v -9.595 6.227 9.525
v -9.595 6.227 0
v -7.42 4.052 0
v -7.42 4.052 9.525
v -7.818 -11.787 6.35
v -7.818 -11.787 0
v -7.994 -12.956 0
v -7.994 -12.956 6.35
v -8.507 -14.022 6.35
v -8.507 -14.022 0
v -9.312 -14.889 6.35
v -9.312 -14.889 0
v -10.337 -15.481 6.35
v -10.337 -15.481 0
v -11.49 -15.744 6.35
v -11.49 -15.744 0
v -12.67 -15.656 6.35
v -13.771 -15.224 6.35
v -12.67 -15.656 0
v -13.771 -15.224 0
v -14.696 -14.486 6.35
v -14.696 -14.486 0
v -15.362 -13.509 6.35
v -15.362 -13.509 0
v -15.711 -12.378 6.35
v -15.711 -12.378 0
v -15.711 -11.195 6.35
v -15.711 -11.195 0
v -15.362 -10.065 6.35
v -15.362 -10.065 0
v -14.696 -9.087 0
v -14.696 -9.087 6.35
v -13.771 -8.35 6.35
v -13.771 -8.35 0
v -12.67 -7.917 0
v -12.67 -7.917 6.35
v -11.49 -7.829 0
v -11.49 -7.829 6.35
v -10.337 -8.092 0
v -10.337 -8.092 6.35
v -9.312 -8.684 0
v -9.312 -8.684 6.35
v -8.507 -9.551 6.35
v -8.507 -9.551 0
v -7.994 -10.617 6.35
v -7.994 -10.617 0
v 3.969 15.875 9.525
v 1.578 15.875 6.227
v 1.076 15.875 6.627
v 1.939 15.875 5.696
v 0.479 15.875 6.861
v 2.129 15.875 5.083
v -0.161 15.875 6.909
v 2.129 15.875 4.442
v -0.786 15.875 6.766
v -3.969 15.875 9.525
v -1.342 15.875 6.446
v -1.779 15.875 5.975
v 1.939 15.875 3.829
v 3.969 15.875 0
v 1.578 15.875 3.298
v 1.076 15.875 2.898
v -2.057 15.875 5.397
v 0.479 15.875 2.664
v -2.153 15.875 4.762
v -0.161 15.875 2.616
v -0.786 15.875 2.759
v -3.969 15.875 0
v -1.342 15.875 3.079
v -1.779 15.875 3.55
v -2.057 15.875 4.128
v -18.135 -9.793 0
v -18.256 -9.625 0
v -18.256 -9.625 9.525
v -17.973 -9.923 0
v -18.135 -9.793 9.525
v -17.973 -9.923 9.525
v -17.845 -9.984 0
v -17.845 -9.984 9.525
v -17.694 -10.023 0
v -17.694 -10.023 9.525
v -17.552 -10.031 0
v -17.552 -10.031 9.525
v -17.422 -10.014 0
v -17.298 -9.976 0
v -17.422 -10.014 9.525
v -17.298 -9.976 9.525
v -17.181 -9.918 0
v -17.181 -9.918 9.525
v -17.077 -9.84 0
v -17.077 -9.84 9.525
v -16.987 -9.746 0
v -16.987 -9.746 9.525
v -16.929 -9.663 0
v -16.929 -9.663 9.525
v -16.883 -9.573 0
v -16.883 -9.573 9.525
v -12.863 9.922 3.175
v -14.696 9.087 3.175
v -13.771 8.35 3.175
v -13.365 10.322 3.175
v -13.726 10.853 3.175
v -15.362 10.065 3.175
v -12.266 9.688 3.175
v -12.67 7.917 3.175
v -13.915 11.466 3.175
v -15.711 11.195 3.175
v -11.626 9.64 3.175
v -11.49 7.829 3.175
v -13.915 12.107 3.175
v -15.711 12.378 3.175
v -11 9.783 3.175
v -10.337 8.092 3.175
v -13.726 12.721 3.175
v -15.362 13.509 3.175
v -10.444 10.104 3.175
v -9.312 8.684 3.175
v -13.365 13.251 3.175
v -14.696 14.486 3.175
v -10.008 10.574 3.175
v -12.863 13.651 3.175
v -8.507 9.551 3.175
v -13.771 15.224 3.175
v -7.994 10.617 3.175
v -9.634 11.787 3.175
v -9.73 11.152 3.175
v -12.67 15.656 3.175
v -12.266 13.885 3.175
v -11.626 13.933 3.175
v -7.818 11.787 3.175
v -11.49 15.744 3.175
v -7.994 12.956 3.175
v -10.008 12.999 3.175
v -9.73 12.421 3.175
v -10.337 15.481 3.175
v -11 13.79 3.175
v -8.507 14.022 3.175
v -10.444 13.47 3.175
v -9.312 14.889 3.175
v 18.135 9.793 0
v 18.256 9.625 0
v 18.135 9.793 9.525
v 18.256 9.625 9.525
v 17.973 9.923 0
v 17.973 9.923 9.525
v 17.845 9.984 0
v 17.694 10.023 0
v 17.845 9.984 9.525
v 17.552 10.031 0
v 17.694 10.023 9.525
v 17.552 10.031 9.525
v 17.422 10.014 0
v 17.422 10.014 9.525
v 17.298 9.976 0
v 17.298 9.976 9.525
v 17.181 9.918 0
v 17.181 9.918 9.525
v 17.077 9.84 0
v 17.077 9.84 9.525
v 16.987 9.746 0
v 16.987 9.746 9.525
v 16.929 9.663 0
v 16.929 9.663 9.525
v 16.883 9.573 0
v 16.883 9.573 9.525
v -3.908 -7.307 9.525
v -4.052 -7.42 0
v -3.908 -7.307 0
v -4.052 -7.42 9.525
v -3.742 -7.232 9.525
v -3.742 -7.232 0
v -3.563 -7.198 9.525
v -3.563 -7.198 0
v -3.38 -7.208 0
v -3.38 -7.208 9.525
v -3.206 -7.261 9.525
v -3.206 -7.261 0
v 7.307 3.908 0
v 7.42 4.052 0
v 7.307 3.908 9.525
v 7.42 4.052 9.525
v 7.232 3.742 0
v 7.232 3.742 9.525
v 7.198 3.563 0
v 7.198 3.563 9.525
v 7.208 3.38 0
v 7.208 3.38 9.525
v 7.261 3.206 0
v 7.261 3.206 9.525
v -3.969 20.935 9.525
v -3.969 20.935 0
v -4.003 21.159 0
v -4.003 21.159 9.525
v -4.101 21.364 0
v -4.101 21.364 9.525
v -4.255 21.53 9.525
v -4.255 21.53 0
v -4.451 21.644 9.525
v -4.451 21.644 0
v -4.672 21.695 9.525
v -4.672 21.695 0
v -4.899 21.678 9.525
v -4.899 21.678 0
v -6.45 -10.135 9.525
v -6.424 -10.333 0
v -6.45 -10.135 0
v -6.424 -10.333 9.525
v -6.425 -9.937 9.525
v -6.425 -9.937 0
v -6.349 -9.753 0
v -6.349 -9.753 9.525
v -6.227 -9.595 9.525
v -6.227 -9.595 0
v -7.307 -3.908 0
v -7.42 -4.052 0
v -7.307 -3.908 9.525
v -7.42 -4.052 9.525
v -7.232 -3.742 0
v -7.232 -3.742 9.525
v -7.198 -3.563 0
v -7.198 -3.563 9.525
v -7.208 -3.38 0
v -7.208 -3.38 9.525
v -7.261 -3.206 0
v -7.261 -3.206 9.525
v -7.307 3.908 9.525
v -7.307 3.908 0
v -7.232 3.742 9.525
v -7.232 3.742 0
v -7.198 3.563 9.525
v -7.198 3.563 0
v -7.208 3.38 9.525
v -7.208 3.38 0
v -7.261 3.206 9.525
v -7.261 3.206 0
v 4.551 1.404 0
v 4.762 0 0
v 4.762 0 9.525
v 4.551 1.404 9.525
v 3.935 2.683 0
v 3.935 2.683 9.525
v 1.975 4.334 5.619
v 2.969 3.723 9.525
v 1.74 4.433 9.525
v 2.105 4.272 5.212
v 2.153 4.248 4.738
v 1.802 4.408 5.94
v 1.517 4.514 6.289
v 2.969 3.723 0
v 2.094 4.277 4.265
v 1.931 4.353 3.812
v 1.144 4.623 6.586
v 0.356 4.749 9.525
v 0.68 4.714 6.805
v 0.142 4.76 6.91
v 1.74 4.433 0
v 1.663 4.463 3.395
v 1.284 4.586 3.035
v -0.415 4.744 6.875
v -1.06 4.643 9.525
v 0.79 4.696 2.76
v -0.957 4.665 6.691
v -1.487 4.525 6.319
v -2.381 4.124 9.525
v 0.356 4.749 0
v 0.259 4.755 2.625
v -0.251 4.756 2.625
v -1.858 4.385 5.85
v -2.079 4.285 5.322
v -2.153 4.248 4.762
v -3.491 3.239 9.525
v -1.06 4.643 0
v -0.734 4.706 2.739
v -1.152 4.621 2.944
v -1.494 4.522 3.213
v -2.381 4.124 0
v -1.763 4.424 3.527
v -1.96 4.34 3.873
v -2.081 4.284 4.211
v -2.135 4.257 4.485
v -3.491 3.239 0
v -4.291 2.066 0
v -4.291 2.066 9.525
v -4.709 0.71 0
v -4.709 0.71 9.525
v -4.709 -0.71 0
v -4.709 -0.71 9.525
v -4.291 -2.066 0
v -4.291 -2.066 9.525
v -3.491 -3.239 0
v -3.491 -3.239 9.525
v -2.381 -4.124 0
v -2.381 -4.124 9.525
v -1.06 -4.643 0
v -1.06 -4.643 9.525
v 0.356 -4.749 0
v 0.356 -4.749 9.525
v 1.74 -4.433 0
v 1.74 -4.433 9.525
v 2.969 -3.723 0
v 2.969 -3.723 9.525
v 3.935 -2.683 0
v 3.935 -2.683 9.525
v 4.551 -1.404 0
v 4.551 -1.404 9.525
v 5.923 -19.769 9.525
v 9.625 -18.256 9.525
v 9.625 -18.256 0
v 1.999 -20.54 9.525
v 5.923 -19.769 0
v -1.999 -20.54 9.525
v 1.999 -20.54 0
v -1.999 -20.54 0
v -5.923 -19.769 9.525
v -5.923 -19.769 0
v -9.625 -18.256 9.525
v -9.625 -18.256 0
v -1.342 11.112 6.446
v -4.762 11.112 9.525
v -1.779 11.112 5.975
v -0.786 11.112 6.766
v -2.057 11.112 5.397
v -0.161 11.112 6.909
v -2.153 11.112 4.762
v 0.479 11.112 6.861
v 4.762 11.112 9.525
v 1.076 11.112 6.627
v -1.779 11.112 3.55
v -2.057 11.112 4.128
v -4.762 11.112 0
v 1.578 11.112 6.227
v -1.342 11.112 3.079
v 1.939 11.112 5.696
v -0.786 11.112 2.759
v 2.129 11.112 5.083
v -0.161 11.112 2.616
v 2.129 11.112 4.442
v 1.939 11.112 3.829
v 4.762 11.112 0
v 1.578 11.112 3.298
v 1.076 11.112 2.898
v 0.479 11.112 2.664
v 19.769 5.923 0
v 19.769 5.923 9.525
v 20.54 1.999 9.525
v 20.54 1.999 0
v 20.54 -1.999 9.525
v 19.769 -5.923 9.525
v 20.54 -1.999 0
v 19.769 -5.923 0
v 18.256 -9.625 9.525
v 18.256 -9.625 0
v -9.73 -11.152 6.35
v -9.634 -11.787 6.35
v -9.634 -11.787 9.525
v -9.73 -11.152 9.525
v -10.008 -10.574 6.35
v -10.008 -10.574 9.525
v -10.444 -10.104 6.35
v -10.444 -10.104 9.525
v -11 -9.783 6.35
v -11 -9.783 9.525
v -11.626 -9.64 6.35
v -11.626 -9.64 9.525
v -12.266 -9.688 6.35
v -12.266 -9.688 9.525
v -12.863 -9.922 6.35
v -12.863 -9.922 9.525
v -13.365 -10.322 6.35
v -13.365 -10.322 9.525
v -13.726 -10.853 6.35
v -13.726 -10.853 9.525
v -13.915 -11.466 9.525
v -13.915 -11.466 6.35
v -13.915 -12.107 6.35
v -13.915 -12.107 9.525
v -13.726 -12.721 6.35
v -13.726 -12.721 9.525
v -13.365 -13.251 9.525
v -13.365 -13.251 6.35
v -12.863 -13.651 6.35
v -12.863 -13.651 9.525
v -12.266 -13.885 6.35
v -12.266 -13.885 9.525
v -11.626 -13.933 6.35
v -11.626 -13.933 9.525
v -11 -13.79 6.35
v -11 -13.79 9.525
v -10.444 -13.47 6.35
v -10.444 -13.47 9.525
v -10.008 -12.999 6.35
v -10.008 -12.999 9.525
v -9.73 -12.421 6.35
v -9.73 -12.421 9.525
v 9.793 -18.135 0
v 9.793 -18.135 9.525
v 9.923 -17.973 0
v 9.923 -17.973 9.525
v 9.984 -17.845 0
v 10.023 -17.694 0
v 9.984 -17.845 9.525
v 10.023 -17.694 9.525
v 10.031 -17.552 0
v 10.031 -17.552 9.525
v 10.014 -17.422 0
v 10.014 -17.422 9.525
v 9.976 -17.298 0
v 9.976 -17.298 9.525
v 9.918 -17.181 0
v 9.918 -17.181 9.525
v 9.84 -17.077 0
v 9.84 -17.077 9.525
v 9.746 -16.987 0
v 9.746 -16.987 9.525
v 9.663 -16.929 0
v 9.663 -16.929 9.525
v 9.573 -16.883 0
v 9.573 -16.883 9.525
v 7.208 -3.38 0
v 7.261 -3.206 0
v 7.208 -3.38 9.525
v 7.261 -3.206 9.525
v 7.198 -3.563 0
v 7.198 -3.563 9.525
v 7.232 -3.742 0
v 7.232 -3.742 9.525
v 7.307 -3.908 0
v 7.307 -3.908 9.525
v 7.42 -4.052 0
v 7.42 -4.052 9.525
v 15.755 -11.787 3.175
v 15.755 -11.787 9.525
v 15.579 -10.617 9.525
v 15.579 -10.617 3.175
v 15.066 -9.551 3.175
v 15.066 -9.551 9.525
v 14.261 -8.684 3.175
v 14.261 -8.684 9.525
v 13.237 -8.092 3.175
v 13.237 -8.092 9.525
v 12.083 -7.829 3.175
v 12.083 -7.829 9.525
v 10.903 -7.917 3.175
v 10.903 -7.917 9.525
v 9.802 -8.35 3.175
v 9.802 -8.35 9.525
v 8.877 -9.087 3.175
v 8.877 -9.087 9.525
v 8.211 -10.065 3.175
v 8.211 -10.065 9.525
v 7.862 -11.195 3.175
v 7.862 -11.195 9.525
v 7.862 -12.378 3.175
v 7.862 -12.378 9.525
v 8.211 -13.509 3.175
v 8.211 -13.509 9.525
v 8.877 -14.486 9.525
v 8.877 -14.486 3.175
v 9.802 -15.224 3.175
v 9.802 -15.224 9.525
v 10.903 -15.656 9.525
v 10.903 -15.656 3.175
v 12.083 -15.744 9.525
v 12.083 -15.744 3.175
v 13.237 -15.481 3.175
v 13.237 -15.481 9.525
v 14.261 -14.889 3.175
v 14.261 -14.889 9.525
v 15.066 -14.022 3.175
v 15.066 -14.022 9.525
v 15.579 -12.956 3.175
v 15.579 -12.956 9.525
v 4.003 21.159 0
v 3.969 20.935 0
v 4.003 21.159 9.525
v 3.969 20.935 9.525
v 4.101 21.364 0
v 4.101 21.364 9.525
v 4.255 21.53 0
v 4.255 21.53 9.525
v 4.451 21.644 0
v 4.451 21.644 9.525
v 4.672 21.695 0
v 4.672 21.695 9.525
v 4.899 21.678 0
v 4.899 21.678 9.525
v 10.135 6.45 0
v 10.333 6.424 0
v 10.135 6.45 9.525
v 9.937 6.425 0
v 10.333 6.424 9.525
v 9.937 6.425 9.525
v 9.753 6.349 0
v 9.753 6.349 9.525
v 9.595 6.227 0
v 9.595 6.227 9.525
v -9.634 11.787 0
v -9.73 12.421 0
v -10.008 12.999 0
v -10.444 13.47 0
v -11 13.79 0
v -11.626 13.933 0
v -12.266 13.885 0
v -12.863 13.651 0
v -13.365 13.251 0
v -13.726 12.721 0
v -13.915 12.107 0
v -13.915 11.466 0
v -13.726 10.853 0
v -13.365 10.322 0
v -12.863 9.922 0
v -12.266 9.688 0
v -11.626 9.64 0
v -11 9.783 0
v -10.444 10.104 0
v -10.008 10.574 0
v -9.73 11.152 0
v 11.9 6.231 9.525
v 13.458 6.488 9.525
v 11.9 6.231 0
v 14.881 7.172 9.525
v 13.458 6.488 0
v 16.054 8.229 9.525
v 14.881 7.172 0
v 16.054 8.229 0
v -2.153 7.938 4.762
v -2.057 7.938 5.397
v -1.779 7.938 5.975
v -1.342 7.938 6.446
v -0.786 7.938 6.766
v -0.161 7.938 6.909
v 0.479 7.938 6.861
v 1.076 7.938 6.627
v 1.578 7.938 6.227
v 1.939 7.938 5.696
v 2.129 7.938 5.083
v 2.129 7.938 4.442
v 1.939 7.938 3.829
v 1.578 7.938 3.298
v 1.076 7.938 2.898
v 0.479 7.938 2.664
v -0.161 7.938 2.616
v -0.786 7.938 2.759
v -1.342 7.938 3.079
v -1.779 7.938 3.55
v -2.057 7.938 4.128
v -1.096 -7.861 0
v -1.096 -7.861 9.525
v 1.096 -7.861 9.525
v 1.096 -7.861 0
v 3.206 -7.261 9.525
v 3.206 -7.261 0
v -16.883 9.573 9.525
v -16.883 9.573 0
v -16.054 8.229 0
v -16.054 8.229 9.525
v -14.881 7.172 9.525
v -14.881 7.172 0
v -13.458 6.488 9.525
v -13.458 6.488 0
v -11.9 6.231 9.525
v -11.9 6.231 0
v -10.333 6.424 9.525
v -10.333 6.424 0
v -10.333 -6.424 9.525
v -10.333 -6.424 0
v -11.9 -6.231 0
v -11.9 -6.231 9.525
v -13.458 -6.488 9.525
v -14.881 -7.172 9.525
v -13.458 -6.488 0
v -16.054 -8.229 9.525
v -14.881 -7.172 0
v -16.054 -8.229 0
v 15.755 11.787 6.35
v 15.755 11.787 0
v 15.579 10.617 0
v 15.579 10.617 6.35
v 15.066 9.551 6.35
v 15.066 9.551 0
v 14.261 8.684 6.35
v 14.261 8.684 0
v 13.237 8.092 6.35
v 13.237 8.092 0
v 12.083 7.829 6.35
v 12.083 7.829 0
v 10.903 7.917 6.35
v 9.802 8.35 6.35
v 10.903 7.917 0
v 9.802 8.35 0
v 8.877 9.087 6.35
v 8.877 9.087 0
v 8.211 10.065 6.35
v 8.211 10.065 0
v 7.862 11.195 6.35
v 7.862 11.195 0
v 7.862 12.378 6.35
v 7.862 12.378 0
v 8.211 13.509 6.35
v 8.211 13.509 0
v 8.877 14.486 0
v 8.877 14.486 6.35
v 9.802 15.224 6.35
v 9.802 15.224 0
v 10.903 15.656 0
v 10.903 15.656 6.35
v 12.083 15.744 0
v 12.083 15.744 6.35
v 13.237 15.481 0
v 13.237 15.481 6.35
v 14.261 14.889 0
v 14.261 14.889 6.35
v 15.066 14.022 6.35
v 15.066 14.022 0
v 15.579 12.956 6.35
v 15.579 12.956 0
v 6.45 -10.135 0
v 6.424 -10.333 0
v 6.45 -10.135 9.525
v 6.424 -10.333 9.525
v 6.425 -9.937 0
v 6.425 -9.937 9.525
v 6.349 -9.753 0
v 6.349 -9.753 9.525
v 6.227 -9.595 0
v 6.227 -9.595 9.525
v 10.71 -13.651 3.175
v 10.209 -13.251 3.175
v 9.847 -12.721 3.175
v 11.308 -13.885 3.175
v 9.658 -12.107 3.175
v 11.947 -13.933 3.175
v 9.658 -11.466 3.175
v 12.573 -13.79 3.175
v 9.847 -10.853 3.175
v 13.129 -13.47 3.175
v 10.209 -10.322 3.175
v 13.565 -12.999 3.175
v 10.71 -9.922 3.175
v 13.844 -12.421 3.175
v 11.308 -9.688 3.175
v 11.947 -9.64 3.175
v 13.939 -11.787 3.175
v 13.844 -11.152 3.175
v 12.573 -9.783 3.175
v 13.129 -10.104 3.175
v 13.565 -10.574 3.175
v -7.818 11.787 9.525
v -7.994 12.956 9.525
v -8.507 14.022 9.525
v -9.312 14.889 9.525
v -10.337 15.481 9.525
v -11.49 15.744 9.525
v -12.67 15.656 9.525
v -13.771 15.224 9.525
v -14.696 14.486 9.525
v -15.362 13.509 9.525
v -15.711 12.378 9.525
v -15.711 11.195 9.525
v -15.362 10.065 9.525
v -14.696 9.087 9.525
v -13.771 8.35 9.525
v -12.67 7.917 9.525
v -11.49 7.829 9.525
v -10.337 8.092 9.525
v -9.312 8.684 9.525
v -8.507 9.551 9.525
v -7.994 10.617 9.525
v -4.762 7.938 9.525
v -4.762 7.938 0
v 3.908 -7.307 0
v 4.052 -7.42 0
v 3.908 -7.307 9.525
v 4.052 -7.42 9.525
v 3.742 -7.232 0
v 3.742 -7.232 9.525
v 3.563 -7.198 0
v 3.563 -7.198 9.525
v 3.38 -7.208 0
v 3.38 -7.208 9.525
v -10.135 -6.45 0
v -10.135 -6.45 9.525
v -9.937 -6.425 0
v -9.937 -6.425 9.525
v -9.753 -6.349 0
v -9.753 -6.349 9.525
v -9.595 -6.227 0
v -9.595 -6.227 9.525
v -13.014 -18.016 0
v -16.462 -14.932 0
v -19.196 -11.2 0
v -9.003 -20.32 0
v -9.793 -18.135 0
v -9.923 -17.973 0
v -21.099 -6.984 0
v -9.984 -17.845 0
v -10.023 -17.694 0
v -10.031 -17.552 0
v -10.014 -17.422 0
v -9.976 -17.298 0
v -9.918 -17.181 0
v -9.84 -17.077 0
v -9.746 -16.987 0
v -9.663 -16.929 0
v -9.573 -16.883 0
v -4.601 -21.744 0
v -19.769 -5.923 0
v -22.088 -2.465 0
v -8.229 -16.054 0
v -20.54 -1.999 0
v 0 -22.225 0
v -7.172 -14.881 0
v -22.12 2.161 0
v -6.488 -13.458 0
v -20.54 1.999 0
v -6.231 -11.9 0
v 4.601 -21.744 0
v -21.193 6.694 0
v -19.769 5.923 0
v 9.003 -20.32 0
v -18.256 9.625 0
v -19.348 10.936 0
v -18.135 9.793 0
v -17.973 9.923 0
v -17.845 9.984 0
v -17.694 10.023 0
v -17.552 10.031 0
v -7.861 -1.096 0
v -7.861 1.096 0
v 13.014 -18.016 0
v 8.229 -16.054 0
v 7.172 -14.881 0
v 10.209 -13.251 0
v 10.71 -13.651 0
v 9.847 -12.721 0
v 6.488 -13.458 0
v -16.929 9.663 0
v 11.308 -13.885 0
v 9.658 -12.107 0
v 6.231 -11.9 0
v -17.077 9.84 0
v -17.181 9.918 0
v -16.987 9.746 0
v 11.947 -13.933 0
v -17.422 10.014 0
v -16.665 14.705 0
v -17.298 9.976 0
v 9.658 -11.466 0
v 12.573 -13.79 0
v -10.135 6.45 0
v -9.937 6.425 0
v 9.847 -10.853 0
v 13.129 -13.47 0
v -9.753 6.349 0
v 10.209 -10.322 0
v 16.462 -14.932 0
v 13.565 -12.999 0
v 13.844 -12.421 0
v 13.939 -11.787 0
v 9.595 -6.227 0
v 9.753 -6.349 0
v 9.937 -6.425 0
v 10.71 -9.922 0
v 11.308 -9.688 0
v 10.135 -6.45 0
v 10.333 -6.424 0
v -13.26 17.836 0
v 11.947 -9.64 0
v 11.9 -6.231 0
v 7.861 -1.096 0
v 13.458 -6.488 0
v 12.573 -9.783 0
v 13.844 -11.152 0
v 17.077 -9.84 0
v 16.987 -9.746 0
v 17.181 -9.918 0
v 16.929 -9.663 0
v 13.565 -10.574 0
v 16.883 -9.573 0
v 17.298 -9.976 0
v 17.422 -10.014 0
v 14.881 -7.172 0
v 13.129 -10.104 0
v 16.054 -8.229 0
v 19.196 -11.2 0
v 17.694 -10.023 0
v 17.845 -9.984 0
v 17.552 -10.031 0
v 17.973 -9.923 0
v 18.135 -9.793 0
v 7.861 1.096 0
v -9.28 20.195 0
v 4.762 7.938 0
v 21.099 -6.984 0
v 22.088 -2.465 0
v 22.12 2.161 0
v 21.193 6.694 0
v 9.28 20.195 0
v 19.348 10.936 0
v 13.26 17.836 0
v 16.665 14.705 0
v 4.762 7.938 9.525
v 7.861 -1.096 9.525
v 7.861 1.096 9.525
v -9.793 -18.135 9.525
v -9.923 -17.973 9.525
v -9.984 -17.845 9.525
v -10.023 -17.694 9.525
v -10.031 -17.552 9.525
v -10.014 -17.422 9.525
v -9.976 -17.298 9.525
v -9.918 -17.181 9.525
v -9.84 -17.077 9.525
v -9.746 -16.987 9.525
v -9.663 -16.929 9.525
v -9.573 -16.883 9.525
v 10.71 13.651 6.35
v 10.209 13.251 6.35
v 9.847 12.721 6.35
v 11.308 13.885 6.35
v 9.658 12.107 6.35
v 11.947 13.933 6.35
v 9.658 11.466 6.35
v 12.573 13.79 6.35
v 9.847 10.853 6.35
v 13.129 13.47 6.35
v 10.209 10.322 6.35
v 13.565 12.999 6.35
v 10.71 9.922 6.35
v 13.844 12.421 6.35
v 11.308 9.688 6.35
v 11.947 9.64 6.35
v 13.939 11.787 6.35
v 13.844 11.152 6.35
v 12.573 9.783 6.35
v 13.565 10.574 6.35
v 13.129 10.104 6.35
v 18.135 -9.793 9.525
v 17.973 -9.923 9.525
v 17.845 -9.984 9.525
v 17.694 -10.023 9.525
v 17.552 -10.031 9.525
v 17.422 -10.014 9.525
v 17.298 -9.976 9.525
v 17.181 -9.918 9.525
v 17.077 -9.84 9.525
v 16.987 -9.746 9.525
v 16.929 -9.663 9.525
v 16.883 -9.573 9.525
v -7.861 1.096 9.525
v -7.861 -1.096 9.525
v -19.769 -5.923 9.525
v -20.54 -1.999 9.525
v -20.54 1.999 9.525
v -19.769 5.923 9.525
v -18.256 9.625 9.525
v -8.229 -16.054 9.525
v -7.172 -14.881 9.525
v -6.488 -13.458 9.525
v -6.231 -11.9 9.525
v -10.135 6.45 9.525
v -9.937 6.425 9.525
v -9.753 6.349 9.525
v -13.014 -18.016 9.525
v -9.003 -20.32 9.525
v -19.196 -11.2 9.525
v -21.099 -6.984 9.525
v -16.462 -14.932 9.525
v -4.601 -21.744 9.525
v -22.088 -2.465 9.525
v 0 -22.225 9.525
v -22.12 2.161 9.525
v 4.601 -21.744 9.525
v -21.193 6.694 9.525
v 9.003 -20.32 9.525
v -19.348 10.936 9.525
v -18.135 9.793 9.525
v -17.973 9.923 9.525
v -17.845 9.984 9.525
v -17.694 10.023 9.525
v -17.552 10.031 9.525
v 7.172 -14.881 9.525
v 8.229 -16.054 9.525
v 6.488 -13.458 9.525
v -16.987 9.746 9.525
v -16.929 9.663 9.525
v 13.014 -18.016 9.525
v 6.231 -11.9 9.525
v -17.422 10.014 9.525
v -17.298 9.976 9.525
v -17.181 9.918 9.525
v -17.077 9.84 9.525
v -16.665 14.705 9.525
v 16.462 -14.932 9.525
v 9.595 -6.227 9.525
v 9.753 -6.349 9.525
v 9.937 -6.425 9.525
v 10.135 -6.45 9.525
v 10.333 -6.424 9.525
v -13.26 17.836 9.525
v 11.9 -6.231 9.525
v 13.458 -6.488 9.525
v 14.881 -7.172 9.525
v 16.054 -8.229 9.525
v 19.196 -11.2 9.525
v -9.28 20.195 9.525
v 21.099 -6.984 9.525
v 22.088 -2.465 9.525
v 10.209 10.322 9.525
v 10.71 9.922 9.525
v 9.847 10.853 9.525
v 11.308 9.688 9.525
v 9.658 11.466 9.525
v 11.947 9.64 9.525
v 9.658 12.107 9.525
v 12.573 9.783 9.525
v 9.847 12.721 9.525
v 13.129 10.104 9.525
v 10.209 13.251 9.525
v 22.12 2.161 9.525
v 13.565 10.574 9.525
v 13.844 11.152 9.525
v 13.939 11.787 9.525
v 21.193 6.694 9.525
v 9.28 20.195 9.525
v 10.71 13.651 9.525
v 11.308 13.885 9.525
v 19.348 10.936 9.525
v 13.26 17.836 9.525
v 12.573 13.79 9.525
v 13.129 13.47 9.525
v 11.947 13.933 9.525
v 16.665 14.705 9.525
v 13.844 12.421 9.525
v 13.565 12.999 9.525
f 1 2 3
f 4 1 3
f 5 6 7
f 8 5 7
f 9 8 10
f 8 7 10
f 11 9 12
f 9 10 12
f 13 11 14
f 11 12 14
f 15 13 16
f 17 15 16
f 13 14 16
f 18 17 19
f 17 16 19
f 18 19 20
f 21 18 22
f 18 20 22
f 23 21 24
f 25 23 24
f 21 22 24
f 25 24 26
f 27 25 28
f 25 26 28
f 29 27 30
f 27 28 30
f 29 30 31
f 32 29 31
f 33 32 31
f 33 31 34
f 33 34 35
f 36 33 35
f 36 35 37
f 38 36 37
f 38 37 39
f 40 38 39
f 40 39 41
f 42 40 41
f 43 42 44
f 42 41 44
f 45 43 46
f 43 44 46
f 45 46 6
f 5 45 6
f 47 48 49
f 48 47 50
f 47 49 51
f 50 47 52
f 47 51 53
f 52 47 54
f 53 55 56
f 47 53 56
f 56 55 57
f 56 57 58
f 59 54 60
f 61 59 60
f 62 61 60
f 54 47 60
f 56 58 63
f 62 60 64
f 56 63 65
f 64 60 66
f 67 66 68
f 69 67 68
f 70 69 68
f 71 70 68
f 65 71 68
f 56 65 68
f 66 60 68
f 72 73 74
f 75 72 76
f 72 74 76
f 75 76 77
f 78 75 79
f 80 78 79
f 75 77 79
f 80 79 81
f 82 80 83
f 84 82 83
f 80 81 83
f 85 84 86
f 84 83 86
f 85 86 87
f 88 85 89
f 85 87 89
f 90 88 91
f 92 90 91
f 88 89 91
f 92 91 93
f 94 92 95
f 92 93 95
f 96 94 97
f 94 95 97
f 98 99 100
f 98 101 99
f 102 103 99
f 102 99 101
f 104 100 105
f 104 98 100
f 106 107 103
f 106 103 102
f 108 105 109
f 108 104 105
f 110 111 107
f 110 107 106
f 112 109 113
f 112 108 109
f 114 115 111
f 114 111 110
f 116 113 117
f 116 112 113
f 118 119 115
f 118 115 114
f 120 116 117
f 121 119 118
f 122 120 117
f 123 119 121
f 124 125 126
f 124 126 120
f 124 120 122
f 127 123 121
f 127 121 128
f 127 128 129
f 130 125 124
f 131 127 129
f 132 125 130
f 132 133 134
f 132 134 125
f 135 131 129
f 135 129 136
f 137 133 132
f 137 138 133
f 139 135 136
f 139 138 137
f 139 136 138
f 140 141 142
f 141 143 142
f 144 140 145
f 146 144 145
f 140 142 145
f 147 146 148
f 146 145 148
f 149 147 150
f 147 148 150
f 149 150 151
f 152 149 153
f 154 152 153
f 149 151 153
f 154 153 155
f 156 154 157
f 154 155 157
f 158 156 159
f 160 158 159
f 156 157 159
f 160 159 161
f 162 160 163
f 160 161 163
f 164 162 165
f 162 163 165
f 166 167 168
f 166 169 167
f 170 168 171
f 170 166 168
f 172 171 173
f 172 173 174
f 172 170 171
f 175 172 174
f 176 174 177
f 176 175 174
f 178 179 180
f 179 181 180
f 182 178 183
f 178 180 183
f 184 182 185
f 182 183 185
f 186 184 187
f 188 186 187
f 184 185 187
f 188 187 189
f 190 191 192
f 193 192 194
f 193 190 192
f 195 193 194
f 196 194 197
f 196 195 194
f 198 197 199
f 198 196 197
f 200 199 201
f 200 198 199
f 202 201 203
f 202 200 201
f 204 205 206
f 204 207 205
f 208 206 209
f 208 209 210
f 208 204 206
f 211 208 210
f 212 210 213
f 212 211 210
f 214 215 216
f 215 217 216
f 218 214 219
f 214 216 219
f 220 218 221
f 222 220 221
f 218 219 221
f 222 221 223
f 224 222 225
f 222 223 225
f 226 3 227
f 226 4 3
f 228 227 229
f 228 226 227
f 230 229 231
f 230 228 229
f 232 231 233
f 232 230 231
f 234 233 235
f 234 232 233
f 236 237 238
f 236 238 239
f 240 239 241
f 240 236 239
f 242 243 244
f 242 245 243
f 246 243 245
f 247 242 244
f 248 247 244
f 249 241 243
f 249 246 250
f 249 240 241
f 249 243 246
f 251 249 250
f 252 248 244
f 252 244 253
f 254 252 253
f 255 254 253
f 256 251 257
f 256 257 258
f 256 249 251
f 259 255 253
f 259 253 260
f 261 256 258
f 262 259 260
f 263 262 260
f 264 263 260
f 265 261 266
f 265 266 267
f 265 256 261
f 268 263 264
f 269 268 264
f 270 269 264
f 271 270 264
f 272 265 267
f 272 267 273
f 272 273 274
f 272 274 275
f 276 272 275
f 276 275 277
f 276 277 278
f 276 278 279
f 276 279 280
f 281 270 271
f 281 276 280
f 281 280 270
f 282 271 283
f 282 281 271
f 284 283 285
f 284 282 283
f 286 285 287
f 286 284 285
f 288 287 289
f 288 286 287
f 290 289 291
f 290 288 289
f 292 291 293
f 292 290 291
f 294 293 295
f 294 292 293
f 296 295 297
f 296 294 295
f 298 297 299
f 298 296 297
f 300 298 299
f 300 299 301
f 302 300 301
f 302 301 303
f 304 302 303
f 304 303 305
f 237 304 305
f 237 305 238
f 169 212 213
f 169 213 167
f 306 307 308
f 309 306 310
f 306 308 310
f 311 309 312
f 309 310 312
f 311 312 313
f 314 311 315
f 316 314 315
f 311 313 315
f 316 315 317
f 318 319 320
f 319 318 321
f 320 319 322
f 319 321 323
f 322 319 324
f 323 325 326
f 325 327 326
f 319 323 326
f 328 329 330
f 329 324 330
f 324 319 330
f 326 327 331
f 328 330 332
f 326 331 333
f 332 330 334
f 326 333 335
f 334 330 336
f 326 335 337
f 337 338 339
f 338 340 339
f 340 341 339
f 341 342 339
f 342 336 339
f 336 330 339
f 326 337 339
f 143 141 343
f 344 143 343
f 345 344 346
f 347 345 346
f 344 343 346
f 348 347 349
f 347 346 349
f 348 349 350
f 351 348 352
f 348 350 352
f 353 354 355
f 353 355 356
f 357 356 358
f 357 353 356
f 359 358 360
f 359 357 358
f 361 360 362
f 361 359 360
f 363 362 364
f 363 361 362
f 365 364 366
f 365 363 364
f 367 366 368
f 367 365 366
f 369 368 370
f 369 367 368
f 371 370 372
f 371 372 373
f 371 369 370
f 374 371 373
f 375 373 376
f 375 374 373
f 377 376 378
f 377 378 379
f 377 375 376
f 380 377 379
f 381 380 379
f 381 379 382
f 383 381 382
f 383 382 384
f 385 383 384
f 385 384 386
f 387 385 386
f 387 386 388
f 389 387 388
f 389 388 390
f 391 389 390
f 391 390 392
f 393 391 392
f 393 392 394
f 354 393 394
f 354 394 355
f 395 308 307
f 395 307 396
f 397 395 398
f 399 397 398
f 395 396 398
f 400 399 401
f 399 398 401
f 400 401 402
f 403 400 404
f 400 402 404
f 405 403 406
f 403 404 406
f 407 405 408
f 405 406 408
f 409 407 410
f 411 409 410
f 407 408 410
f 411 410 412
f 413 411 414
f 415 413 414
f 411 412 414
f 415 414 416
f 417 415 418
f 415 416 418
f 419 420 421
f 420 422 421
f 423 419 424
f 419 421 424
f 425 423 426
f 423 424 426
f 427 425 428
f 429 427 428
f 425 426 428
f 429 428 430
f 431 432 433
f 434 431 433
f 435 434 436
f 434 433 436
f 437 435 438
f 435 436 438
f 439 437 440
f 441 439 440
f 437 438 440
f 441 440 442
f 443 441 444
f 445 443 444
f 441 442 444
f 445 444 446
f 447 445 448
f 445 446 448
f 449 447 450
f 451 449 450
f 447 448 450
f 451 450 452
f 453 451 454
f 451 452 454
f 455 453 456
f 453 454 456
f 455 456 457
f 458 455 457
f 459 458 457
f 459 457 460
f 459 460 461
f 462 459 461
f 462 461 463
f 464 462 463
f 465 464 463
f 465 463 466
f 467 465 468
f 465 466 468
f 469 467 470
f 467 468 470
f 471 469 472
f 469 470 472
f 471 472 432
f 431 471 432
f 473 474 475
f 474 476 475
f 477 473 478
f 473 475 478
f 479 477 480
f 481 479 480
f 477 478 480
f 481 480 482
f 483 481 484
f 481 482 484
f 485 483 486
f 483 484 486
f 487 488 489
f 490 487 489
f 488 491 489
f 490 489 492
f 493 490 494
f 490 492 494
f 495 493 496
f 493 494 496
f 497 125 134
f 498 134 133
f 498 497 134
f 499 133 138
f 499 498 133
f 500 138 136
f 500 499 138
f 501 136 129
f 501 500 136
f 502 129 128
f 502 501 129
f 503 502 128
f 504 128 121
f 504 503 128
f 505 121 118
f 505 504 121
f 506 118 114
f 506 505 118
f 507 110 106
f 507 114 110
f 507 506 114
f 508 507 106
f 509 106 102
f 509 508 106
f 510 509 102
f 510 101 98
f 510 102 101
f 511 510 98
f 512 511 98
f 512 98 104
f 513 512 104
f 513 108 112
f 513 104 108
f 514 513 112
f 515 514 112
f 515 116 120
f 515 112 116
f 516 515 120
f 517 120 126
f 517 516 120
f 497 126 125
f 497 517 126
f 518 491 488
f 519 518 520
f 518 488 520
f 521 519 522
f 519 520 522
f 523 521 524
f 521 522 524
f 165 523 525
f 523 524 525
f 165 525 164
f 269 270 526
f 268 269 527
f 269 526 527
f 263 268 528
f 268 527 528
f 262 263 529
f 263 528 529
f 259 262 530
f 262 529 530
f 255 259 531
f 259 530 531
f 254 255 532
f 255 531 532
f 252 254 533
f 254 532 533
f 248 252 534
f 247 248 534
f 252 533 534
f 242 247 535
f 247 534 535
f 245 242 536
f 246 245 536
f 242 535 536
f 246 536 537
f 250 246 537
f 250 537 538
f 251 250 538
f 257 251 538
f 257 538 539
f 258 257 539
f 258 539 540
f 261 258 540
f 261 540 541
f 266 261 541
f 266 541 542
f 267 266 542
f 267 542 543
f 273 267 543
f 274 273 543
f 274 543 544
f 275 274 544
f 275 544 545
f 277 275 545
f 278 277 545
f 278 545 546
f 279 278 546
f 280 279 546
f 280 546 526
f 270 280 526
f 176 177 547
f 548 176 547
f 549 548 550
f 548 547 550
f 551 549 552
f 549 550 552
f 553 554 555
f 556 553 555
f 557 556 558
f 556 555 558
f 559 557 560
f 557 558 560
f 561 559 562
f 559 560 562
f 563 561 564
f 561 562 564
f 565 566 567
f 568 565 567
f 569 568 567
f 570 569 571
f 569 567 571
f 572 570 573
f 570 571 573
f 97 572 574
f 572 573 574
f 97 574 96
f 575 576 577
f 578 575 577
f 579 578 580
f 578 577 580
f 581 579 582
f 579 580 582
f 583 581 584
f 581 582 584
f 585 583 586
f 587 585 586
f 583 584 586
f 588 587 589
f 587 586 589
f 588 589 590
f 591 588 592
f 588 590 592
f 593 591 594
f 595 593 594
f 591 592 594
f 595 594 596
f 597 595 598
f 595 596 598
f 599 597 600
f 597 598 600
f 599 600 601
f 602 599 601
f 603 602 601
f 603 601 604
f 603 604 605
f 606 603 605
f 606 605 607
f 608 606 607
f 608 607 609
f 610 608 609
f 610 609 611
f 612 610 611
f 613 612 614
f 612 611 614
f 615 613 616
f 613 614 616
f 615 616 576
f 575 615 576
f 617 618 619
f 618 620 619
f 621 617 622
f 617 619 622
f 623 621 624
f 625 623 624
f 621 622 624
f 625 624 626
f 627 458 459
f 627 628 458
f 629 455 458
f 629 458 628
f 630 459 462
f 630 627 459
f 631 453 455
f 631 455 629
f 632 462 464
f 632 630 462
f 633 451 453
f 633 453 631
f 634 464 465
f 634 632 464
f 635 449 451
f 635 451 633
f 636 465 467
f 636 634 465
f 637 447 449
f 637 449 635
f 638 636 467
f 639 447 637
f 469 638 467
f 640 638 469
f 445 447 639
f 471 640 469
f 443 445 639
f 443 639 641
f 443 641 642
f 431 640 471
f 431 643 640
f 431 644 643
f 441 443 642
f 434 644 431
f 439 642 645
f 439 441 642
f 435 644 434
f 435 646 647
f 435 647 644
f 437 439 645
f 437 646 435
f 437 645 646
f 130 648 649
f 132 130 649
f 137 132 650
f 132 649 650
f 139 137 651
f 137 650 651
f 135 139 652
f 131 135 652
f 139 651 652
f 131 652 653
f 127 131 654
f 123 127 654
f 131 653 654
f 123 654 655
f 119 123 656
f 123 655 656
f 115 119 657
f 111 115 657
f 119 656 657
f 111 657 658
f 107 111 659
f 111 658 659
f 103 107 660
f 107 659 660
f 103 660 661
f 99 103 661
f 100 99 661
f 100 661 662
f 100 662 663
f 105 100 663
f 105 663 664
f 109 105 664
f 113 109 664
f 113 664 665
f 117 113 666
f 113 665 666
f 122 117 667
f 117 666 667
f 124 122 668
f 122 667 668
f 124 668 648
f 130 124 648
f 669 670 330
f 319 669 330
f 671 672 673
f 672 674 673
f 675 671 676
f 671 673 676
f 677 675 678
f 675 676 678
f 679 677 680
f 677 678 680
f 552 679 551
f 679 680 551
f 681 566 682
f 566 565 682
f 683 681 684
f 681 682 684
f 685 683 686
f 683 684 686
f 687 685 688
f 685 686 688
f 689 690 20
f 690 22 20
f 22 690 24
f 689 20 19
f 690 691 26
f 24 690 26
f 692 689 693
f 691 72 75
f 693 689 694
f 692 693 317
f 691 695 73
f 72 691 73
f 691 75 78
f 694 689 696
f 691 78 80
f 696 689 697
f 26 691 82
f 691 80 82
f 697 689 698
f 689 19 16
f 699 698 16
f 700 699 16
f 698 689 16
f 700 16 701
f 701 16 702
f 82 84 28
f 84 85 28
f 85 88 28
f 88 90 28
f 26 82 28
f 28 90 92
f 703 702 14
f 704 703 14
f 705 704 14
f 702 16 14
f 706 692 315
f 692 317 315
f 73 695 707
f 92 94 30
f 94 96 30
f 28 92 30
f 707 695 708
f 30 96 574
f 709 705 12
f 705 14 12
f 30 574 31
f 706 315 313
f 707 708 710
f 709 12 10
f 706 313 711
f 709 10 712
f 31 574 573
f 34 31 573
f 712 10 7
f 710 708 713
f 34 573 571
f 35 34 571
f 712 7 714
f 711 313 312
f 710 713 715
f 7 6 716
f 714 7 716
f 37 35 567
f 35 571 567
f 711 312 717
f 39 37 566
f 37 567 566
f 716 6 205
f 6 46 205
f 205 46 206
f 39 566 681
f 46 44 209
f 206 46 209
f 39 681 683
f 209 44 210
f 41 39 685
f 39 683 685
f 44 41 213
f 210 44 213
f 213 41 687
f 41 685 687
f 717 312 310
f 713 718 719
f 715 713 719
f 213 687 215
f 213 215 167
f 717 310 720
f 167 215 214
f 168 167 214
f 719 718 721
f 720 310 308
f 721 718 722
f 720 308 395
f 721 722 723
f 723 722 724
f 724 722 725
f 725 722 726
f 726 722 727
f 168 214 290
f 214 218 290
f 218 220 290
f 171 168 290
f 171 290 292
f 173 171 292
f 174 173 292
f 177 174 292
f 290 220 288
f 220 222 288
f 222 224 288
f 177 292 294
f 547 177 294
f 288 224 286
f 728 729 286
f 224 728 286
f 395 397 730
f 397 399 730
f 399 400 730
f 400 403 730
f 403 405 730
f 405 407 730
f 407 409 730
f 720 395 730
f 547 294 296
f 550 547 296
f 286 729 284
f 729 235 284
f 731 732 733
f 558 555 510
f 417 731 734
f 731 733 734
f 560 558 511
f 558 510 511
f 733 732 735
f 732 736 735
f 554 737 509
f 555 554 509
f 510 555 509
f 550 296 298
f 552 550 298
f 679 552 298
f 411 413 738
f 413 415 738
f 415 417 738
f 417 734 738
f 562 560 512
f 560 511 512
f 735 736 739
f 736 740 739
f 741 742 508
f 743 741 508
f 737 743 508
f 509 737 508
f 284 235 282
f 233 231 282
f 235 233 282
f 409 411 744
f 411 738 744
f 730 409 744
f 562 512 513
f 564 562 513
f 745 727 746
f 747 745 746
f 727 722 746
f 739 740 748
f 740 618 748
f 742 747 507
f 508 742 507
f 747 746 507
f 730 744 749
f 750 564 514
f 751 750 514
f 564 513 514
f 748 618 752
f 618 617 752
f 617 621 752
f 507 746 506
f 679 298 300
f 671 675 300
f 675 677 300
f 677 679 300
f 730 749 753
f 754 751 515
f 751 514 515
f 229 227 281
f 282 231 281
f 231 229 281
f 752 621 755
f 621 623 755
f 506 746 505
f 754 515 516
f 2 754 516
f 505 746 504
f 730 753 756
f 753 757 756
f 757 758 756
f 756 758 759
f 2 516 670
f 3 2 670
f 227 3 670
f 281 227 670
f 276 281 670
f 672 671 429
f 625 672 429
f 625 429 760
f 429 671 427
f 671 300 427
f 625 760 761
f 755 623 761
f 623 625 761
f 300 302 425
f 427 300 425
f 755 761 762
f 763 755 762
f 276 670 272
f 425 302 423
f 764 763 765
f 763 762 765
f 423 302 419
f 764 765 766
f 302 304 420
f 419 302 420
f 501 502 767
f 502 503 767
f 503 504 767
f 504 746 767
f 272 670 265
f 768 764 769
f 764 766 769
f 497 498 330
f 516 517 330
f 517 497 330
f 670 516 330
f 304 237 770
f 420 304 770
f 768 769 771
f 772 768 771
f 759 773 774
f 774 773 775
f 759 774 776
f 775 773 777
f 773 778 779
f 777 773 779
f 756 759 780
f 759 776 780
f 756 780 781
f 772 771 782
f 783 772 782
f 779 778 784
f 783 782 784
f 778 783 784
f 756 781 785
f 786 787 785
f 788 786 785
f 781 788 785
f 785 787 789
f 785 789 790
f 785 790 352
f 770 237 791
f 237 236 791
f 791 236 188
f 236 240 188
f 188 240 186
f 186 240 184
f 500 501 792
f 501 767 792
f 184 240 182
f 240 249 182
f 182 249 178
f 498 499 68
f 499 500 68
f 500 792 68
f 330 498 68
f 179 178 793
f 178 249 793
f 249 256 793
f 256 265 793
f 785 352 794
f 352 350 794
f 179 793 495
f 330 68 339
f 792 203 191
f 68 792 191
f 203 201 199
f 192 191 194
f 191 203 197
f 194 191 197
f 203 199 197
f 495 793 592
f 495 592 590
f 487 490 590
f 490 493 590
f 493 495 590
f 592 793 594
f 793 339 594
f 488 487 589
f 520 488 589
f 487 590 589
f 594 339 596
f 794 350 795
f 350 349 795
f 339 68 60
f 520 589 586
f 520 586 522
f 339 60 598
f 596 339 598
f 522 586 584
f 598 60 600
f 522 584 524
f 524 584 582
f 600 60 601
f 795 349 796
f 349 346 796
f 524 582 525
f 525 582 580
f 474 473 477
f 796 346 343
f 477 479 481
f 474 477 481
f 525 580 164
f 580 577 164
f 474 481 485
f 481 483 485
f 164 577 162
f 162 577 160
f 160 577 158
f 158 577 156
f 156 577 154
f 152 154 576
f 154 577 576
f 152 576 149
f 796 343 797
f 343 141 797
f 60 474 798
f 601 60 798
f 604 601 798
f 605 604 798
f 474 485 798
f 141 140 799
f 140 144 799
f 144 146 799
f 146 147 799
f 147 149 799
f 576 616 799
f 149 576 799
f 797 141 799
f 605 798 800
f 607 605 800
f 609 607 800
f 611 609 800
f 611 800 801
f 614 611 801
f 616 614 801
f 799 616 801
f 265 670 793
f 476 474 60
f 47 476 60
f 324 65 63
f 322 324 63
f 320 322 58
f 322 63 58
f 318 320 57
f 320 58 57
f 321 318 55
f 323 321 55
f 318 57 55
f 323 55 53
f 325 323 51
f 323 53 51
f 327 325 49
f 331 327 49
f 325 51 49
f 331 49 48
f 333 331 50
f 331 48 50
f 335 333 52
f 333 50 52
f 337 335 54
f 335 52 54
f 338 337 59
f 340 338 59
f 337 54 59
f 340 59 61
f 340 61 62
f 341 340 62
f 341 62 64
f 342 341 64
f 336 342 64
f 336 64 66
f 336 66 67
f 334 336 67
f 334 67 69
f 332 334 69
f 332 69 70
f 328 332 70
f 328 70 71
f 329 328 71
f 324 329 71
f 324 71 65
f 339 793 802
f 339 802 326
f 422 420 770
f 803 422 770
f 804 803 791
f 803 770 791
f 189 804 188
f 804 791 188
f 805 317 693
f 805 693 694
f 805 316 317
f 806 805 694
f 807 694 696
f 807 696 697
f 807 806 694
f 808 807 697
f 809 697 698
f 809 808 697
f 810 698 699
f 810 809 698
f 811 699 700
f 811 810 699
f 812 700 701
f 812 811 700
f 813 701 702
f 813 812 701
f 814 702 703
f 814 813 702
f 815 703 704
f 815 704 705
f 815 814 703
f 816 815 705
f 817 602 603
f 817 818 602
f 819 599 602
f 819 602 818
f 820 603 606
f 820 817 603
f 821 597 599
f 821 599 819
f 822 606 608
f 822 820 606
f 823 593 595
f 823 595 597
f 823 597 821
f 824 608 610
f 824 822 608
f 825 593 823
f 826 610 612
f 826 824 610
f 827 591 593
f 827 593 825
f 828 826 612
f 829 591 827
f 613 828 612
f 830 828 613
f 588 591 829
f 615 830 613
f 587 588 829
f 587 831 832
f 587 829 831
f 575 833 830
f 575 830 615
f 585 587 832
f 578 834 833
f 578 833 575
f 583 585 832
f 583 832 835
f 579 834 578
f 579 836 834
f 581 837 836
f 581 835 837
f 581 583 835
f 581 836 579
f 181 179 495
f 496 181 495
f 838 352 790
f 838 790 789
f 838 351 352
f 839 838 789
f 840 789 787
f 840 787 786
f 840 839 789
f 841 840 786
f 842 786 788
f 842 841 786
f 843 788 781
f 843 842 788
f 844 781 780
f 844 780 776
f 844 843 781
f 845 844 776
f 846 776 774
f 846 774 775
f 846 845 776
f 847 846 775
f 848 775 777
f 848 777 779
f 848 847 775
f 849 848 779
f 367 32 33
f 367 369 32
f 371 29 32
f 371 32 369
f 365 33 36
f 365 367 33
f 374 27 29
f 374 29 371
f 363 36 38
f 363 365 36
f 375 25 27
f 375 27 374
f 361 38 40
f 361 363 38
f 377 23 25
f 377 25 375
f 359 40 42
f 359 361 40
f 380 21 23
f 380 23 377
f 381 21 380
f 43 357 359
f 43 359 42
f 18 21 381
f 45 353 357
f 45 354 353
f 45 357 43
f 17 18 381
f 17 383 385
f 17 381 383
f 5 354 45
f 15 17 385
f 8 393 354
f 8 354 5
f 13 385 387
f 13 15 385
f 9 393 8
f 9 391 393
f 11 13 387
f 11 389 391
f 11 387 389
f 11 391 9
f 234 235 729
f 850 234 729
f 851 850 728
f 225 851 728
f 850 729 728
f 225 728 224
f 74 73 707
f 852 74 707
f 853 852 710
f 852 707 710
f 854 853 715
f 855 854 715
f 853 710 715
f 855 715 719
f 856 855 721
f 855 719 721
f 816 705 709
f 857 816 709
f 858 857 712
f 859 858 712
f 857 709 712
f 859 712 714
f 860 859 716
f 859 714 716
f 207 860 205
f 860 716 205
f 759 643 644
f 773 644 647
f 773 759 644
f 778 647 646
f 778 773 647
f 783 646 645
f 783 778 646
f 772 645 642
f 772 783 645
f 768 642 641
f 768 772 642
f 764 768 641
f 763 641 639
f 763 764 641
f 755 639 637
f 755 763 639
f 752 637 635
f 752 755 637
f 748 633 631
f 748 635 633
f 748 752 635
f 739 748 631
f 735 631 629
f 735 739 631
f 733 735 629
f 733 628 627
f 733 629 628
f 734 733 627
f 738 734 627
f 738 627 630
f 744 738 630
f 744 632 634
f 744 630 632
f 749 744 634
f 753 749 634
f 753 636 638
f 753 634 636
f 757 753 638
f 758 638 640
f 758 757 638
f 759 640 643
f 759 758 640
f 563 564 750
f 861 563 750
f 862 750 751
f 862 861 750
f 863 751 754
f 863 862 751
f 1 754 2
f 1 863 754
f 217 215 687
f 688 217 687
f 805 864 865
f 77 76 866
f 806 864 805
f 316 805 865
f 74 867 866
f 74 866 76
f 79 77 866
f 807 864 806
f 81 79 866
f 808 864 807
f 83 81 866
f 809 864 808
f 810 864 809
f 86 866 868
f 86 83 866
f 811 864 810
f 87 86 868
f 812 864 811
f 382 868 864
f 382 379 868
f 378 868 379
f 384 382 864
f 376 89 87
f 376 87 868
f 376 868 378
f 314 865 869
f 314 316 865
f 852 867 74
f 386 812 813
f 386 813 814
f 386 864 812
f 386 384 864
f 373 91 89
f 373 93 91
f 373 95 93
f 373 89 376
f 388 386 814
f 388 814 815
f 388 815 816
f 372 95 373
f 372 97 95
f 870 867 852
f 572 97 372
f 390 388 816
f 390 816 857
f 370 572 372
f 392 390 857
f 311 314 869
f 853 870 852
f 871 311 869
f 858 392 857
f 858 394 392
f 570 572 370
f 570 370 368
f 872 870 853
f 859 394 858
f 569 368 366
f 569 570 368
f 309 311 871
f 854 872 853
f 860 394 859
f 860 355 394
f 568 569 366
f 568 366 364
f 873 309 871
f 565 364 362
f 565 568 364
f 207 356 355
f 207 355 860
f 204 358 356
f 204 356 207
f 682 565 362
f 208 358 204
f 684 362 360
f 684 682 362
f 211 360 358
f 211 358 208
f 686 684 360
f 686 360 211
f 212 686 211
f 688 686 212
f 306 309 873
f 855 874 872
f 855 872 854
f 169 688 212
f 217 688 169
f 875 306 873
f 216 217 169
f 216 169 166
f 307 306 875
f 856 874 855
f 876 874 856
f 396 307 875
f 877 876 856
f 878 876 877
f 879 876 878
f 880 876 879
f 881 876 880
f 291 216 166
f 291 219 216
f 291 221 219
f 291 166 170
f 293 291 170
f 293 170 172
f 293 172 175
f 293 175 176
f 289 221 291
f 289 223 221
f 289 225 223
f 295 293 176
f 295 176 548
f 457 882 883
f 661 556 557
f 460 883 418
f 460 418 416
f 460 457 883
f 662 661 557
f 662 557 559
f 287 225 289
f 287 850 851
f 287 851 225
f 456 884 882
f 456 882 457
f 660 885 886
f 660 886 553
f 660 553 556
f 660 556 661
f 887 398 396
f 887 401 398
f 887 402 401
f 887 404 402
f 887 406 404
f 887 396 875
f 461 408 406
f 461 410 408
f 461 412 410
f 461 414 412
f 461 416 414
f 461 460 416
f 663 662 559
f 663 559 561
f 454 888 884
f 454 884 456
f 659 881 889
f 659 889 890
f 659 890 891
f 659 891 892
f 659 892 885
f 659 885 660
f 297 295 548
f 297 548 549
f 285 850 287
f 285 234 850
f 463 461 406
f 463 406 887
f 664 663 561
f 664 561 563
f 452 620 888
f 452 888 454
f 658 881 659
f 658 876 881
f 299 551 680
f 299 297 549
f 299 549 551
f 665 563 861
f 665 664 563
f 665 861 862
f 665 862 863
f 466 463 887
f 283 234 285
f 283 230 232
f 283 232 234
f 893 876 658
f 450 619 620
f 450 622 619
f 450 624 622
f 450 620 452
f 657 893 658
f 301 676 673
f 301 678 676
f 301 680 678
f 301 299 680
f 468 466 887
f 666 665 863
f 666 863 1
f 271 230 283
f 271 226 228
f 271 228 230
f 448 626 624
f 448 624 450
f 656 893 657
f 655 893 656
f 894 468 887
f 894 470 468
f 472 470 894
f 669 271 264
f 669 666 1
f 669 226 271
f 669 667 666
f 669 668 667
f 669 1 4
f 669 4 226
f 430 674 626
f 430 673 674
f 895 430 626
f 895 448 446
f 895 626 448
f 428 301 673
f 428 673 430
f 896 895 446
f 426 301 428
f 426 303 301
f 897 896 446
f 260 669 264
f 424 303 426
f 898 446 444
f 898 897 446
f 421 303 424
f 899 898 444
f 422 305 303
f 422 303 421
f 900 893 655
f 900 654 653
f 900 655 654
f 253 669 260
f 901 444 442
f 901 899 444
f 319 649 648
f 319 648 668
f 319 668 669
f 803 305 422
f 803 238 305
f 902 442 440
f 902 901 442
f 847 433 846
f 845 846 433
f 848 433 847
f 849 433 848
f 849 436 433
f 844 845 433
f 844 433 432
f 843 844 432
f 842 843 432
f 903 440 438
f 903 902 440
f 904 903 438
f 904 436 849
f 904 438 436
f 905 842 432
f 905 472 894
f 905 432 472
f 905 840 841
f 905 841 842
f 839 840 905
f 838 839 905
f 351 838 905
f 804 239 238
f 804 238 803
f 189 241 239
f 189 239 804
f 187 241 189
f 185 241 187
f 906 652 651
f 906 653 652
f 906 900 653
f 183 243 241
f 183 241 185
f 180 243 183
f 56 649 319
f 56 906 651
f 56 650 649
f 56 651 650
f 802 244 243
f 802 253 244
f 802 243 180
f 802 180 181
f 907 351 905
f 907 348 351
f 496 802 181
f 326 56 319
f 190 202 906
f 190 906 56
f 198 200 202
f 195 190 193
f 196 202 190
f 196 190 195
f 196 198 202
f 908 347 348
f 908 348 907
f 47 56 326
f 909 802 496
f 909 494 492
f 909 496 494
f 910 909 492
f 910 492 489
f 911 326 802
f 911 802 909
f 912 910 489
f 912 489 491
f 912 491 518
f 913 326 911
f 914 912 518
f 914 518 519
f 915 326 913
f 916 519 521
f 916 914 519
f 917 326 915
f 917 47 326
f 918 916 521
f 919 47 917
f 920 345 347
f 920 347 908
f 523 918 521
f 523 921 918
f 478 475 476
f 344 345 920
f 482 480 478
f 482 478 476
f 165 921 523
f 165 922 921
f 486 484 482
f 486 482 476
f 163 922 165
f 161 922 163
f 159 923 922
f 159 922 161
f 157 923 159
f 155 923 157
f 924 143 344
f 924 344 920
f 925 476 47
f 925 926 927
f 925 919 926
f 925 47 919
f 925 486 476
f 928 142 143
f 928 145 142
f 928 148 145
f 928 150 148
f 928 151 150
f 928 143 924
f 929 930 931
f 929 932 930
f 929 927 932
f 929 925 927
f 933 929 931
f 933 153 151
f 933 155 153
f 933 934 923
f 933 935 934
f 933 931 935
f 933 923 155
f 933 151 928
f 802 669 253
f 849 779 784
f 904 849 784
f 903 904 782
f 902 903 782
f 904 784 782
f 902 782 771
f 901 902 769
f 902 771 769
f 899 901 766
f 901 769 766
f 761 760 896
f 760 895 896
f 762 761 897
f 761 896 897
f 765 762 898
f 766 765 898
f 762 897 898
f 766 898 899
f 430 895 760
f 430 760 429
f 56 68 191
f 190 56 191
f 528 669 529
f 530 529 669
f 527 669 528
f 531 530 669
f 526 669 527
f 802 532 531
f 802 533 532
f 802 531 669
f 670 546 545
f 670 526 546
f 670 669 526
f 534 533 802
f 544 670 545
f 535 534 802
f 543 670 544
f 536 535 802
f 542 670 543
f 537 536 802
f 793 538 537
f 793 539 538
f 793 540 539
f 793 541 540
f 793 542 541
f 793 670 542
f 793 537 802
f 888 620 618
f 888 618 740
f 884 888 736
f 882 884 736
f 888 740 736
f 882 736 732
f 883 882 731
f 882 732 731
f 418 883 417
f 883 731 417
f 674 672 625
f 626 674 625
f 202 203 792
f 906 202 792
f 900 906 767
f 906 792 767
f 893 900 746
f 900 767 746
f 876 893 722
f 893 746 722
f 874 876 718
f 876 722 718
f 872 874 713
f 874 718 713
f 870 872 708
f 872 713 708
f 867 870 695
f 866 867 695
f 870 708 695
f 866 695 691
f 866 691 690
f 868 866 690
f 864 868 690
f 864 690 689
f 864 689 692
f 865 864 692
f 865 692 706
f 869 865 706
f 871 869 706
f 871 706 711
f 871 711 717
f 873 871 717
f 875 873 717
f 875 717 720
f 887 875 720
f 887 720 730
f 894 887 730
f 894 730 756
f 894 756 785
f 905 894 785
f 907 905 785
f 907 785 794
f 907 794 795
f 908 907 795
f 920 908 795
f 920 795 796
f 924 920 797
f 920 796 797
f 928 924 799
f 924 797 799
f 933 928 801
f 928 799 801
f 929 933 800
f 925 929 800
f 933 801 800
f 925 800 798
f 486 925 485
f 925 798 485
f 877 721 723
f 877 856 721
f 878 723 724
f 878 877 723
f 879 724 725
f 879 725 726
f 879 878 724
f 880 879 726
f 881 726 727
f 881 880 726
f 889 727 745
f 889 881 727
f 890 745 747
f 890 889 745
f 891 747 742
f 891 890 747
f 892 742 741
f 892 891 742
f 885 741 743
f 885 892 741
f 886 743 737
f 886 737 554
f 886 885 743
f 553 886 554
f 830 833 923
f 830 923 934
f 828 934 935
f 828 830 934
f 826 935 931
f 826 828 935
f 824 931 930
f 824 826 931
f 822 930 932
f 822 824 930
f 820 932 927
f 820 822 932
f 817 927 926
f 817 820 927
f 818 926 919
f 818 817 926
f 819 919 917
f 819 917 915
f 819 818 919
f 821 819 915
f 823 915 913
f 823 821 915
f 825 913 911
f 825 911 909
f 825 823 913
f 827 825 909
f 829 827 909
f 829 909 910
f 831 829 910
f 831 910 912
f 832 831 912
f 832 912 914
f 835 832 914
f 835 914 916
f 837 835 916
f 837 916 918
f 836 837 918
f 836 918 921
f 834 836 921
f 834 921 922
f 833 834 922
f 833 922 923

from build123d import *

# Parameters (mm, degrees)
F0_R            = 2.15265
F0_R_2          = 4.7625
F0_W            = 9.525
F0_H            = 3.175
F1_DEPTH        = 9.525
F2_R            = 2.15265
F3_REACH        = 44.1896136501
F6_R            = 3.96875
F7_DEPTH        = 6.35
F9_DEPTH        = 9.525
F9_COPIES_COUNT = 3
F9_COPIES_ANGLE = 180
F10_R           = 0.762
F12_R           = 3.96875
F13_DEPTH       = 6.35


# Not quite as in the source:
# - a feature of the source that left no trace in its solid (it failed there, or was rolled back) is left out
# - a pattern or mirror of a feature is missing from the dataset's text; its kind, count and spacing are read off the source's solid


with BuildPart() as f1:
    # F0 (on Top) → F1 (new body)
    with BuildSketch(Plane.XY):
        with BuildLine():
            Line((3.96875, 15.875), (-3.96875, 15.875))
            Line((-3.96875, 15.875), (-3.96875, 21.8677764859))
            ThreePointArc((-3.96875, 21.8677764859), (0, -22.225), (3.96875, 21.8677764859))
            Line((3.96875, 21.8677764859), (3.96875, 15.875))
        make_face()
        with Locations((-11.7865861589, -11.7865861589)):
            Circle(F0_R, mode=Mode.SUBTRACT)
        with Locations((11.7865861589, -11.7865861589)):
            Circle(F0_R, mode=Mode.SUBTRACT)
        with Locations((-11.7865861589, 11.7865861589)):
            Circle(F0_R, mode=Mode.SUBTRACT)
        Circle(F0_R_2, mode=Mode.SUBTRACT)
        with Locations((0, 9.525)):
            Rectangle(F0_W, F0_H, mode=Mode.SUBTRACT)
        with Locations((11.7865861589, 11.7865861589)):
            Circle(F0_R, mode=Mode.SUBTRACT)
    extrude(amount=F1_DEPTH)

    f3_end = f1.faces().sort_by_distance((-4.7625, 0, 4.7625))[0]
    # F2 (on face) → F3 (cut, up to a face of the model that its end follows)
    with BuildSketch(Plane(origin=(0, 15.875, 0), x_dir=(-1, 0, 0), z_dir=(0, 1, 0))):
        with Locations((0, 4.7625)):
            Circle(F2_R)
    f3_long = extrude(amount=-F3_REACH, mode=Mode.PRIVATE)
    add(split(f3_long, bisect_by=f3_end, keep=Keep.ALL, mode=Mode.PRIVATE).solids().sort_by_distance((0, 15.875, 4.7625))[0], mode=Mode.SUBTRACT)

    # F6 (on face) → F7 (cut, through all)
    with BuildSketch(Plane(origin=(0, 0, 0), x_dir=(1, 0, 0), z_dir=(0, 0, -1))):
        with Locations((11.7865861589, -11.7865861589)):
            Circle(F6_R)
        with Locations((-11.7865861589, 11.7865861589)):
            Circle(F6_R)
    extrude(amount=-F7_DEPTH, mode=Mode.SUBTRACT)

    # F8 (on face) → F9 (cut, through all)
    with BuildSketch(Plane(origin=(0, 0, 0), x_dir=(1, 0, 0), z_dir=(0, 0, -1))):
        with BuildLine():
            ThreePointArc((-17.3148424047, -11.229543123), (-14.7565267097, -7.0906978311), (-9.9206262673, -6.5530302219))
            Line((-9.9206262673, -6.5530302219), (-7.0379344931, -3.6703384477))
            ThreePointArc((-7.0379344931, -3.6703384477), (-7.9375, 0), (-7.0379344931, 3.6703384477))
            Line((-7.0379344931, 3.6703384477), (-9.9206262673, 6.5530302219))
            ThreePointArc((-9.9206262673, 6.5530302219), (-14.7565267097, 7.0906978311), (-17.3148424047, 11.229543123))
            ThreePointArc((-17.3148424047, 11.229543123), (-20.6375, 0), (-17.3148424047, -11.229543123))
        make_face()
    f9 = extrude(amount=-F9_DEPTH, mode=Mode.SUBTRACT)

    # F9_copies: F9 ×3 about axis
    f9_copies_axis = Axis((0, 0, 0), (0, 0, 1))
    for i in range(1, F9_COPIES_COUNT):
        add(f9.rotate(f9_copies_axis, i * F9_COPIES_ANGLE / (F9_COPIES_COUNT - 1)), mode=Mode.SUBTRACT)

    # F10
    f10_edges = [f1.edges().sort_by_distance(p)[0] for p in [
        (-17.314842, -11.229543, 4.7625),
        (-9.920626, -6.55303, 4.7625),
        (-7.037934, -3.670338, 4.7625),
        (-7.037934, 3.670338, 4.7625),
        (-9.920626, 6.55303, 4.7625),
        (-17.314842, 11.229543, 4.7625),
        (3.96875, 21.867776, 4.7625),
        (-3.96875, 21.867776, 4.7625),
        (11.229543, -17.314842, 4.7625),
        (-11.229543, -17.314842, 4.7625),
        (6.55303, -9.920626, 4.7625),
        (-6.55303, -9.920626, 4.7625),
        (3.670338, -7.037934, 4.7625),
        (-3.670338, -7.037934, 4.7625),
        (17.314842, 11.229543, 4.7625),
        (17.314842, -11.229543, 4.7625),
        (9.920626, 6.55303, 4.7625),
        (7.037934, 3.670338, 4.7625),
        (7.037934, -3.670338, 4.7625),
        (9.920626, -6.55303, 4.7625),
    ]]
    fillet(f10_edges, radius=F10_R)

    # F12 (on face) → F13 (cut, through all)
    with BuildSketch(Plane.XY.offset(9.525)):
        with Locations((11.7865861589, -11.7865861589)):
            Circle(F12_R)
        with Locations((-11.7865861589, 11.7865861589)):
            Circle(F12_R)
    extrude(amount=-F13_DEPTH, mode=Mode.SUBTRACT)


solid = f1.part
